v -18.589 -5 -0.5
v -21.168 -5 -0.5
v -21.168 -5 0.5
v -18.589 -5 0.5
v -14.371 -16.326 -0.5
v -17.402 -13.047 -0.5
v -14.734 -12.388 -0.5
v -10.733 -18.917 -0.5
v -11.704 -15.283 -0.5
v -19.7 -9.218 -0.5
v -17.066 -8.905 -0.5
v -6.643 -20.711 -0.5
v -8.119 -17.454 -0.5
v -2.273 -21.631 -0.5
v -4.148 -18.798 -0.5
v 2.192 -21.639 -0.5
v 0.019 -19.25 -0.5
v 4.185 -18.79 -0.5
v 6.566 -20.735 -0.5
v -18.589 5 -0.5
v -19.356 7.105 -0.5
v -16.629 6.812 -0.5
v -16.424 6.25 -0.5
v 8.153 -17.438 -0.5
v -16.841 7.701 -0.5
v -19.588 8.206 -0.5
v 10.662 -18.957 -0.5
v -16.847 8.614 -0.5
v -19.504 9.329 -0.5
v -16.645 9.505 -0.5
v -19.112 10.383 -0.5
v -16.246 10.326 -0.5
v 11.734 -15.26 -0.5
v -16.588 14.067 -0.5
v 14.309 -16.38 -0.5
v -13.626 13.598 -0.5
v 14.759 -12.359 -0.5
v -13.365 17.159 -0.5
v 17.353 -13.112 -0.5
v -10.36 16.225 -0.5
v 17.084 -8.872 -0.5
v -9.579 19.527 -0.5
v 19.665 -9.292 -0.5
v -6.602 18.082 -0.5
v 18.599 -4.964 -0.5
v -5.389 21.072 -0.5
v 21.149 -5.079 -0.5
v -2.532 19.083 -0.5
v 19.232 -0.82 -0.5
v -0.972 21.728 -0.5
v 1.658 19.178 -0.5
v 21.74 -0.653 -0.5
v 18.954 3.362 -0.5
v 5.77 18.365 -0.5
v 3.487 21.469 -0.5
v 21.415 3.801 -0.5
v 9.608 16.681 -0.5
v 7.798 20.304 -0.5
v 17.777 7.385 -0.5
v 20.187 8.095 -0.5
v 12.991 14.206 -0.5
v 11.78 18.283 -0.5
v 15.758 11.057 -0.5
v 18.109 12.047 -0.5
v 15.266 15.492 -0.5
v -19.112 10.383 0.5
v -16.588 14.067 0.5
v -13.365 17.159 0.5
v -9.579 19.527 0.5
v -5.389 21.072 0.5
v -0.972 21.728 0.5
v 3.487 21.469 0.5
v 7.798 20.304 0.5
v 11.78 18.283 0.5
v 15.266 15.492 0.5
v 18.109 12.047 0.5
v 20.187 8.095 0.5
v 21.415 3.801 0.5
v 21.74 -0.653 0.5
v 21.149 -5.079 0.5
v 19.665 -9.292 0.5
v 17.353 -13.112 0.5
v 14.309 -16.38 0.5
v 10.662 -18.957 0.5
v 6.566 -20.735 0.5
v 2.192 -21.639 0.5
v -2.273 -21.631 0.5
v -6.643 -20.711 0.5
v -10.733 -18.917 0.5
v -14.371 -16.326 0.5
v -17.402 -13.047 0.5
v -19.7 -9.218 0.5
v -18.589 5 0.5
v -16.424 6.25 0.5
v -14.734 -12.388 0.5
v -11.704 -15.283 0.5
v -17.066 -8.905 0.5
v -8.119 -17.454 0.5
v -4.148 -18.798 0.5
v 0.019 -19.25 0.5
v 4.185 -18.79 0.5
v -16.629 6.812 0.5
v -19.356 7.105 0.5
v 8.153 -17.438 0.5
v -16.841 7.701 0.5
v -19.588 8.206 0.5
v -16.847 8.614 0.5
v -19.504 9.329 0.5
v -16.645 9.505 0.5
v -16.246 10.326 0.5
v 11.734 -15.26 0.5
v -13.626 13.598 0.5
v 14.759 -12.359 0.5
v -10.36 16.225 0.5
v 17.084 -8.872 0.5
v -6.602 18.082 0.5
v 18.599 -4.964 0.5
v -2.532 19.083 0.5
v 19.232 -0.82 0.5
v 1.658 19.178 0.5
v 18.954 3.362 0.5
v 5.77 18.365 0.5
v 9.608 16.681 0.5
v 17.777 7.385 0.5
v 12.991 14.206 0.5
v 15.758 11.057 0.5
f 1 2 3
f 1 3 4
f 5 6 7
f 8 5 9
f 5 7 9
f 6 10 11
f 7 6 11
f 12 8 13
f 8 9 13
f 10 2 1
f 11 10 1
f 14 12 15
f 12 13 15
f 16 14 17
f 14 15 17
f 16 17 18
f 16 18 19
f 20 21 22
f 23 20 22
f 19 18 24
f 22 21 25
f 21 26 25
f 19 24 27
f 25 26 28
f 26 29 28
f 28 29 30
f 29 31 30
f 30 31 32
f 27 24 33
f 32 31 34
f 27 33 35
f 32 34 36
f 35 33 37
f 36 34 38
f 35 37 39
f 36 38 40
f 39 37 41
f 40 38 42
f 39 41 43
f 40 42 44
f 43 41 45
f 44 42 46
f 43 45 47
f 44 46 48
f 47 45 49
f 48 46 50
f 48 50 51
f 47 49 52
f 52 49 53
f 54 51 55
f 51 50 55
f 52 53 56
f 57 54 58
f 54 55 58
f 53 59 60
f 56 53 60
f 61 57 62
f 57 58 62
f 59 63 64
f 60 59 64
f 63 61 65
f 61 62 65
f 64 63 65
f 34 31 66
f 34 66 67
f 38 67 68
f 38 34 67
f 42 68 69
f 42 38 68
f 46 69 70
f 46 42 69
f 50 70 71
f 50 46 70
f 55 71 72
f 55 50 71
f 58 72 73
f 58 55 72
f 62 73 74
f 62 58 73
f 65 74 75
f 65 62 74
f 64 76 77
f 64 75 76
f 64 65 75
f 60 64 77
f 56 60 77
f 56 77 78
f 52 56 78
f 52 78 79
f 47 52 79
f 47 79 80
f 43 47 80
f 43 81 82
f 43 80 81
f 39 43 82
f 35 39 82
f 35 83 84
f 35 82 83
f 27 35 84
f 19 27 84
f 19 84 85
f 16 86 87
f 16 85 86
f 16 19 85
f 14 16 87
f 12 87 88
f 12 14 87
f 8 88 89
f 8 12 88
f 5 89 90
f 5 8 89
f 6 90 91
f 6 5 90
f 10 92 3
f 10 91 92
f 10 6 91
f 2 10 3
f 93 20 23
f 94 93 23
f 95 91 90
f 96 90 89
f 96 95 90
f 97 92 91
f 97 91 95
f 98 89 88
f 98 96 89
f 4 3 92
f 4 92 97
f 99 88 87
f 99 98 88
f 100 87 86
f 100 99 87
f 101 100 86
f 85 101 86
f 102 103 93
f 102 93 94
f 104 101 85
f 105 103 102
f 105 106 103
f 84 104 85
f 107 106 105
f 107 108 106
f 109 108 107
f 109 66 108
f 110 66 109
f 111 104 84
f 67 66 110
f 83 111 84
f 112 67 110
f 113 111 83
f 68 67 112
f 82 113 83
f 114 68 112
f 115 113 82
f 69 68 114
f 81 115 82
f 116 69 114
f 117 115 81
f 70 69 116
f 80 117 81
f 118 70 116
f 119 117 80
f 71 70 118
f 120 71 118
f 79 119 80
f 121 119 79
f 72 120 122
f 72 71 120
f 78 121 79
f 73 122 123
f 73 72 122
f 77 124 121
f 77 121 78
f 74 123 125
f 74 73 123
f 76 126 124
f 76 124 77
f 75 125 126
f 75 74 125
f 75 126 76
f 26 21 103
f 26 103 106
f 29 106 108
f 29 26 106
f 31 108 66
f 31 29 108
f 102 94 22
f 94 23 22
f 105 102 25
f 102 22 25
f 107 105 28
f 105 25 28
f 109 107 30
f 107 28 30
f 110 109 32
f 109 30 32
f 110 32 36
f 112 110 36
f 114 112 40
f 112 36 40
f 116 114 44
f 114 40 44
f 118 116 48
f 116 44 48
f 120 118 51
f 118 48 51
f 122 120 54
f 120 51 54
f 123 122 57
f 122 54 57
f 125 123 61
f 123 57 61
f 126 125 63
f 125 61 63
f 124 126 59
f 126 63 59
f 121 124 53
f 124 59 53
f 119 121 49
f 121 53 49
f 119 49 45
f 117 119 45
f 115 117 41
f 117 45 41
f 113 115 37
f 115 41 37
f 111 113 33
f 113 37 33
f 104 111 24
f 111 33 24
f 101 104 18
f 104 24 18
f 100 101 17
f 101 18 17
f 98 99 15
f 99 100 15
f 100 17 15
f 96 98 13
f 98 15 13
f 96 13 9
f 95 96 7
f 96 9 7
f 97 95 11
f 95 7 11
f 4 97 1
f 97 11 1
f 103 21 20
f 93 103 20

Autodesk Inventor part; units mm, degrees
ref_plane "YZ Plane" through (0, 0, 0) normal (1, 0, 0) x (0, 1, 0)
ref_plane "XZ Plane" through (0, 0, 0) normal (0, 1, 0) x (-1, 0, 0)
ref_plane "XY Plane" through (0, 0, 0) normal (0, 0, 1) x (1, 0, 0)
sketch "Эскиз1" plane through (0, 0, 0) normal (0, 0, 1) x (1, 0, 0)
  arc A0 (-21.1675, -5) -> (-19.1116, 10.383) centre (0, 0) ccw
  arc A1 (-18.5893, -5) -> (-16.246, 10.3262) centre (0, 0) ccw
  line L0 (-18.5893, 5) -> (-18.5893, -5) construction
  line L1 (-19.3556, 7.1054) -> (-18.5893, 5)
  line L2 (-18.5893, 5) -> (-16.4242, 6.25)
  line L3 (-16.4242, 6.25) -> (-16.629, 6.8124)
  line L4 (-18.5893, 0) -> (0, 0) construction
  arc A2 (-19.1116, 10.383) -> (-19.3556, 7.1054) centre (-15.5969, 8.4735) ccw
  arc A3 (-16.246, 10.3262) -> (-16.629, 6.8124) centre (-12.8702, 8.1805) ccw
  line L5 (-21.1675, -5) -> (-18.5893, -5)
  point P0 (-19.9352, 8.6978)
  point P1 (-17.2553, 8.5333)
  dimension "d0" = 21.75
  dimension "d1" = 2.5
  dimension "d4" = 10
  dimension "d6" = 30
  dimension "d7" = 100
  dimension "d8" = 2.5
  dimension "d9" = 4
extrude "Выдавливание1" add sketch "Эскиз1" along normal mid plane 1
properties part number "68. Кольцо стопорное подшипника"
